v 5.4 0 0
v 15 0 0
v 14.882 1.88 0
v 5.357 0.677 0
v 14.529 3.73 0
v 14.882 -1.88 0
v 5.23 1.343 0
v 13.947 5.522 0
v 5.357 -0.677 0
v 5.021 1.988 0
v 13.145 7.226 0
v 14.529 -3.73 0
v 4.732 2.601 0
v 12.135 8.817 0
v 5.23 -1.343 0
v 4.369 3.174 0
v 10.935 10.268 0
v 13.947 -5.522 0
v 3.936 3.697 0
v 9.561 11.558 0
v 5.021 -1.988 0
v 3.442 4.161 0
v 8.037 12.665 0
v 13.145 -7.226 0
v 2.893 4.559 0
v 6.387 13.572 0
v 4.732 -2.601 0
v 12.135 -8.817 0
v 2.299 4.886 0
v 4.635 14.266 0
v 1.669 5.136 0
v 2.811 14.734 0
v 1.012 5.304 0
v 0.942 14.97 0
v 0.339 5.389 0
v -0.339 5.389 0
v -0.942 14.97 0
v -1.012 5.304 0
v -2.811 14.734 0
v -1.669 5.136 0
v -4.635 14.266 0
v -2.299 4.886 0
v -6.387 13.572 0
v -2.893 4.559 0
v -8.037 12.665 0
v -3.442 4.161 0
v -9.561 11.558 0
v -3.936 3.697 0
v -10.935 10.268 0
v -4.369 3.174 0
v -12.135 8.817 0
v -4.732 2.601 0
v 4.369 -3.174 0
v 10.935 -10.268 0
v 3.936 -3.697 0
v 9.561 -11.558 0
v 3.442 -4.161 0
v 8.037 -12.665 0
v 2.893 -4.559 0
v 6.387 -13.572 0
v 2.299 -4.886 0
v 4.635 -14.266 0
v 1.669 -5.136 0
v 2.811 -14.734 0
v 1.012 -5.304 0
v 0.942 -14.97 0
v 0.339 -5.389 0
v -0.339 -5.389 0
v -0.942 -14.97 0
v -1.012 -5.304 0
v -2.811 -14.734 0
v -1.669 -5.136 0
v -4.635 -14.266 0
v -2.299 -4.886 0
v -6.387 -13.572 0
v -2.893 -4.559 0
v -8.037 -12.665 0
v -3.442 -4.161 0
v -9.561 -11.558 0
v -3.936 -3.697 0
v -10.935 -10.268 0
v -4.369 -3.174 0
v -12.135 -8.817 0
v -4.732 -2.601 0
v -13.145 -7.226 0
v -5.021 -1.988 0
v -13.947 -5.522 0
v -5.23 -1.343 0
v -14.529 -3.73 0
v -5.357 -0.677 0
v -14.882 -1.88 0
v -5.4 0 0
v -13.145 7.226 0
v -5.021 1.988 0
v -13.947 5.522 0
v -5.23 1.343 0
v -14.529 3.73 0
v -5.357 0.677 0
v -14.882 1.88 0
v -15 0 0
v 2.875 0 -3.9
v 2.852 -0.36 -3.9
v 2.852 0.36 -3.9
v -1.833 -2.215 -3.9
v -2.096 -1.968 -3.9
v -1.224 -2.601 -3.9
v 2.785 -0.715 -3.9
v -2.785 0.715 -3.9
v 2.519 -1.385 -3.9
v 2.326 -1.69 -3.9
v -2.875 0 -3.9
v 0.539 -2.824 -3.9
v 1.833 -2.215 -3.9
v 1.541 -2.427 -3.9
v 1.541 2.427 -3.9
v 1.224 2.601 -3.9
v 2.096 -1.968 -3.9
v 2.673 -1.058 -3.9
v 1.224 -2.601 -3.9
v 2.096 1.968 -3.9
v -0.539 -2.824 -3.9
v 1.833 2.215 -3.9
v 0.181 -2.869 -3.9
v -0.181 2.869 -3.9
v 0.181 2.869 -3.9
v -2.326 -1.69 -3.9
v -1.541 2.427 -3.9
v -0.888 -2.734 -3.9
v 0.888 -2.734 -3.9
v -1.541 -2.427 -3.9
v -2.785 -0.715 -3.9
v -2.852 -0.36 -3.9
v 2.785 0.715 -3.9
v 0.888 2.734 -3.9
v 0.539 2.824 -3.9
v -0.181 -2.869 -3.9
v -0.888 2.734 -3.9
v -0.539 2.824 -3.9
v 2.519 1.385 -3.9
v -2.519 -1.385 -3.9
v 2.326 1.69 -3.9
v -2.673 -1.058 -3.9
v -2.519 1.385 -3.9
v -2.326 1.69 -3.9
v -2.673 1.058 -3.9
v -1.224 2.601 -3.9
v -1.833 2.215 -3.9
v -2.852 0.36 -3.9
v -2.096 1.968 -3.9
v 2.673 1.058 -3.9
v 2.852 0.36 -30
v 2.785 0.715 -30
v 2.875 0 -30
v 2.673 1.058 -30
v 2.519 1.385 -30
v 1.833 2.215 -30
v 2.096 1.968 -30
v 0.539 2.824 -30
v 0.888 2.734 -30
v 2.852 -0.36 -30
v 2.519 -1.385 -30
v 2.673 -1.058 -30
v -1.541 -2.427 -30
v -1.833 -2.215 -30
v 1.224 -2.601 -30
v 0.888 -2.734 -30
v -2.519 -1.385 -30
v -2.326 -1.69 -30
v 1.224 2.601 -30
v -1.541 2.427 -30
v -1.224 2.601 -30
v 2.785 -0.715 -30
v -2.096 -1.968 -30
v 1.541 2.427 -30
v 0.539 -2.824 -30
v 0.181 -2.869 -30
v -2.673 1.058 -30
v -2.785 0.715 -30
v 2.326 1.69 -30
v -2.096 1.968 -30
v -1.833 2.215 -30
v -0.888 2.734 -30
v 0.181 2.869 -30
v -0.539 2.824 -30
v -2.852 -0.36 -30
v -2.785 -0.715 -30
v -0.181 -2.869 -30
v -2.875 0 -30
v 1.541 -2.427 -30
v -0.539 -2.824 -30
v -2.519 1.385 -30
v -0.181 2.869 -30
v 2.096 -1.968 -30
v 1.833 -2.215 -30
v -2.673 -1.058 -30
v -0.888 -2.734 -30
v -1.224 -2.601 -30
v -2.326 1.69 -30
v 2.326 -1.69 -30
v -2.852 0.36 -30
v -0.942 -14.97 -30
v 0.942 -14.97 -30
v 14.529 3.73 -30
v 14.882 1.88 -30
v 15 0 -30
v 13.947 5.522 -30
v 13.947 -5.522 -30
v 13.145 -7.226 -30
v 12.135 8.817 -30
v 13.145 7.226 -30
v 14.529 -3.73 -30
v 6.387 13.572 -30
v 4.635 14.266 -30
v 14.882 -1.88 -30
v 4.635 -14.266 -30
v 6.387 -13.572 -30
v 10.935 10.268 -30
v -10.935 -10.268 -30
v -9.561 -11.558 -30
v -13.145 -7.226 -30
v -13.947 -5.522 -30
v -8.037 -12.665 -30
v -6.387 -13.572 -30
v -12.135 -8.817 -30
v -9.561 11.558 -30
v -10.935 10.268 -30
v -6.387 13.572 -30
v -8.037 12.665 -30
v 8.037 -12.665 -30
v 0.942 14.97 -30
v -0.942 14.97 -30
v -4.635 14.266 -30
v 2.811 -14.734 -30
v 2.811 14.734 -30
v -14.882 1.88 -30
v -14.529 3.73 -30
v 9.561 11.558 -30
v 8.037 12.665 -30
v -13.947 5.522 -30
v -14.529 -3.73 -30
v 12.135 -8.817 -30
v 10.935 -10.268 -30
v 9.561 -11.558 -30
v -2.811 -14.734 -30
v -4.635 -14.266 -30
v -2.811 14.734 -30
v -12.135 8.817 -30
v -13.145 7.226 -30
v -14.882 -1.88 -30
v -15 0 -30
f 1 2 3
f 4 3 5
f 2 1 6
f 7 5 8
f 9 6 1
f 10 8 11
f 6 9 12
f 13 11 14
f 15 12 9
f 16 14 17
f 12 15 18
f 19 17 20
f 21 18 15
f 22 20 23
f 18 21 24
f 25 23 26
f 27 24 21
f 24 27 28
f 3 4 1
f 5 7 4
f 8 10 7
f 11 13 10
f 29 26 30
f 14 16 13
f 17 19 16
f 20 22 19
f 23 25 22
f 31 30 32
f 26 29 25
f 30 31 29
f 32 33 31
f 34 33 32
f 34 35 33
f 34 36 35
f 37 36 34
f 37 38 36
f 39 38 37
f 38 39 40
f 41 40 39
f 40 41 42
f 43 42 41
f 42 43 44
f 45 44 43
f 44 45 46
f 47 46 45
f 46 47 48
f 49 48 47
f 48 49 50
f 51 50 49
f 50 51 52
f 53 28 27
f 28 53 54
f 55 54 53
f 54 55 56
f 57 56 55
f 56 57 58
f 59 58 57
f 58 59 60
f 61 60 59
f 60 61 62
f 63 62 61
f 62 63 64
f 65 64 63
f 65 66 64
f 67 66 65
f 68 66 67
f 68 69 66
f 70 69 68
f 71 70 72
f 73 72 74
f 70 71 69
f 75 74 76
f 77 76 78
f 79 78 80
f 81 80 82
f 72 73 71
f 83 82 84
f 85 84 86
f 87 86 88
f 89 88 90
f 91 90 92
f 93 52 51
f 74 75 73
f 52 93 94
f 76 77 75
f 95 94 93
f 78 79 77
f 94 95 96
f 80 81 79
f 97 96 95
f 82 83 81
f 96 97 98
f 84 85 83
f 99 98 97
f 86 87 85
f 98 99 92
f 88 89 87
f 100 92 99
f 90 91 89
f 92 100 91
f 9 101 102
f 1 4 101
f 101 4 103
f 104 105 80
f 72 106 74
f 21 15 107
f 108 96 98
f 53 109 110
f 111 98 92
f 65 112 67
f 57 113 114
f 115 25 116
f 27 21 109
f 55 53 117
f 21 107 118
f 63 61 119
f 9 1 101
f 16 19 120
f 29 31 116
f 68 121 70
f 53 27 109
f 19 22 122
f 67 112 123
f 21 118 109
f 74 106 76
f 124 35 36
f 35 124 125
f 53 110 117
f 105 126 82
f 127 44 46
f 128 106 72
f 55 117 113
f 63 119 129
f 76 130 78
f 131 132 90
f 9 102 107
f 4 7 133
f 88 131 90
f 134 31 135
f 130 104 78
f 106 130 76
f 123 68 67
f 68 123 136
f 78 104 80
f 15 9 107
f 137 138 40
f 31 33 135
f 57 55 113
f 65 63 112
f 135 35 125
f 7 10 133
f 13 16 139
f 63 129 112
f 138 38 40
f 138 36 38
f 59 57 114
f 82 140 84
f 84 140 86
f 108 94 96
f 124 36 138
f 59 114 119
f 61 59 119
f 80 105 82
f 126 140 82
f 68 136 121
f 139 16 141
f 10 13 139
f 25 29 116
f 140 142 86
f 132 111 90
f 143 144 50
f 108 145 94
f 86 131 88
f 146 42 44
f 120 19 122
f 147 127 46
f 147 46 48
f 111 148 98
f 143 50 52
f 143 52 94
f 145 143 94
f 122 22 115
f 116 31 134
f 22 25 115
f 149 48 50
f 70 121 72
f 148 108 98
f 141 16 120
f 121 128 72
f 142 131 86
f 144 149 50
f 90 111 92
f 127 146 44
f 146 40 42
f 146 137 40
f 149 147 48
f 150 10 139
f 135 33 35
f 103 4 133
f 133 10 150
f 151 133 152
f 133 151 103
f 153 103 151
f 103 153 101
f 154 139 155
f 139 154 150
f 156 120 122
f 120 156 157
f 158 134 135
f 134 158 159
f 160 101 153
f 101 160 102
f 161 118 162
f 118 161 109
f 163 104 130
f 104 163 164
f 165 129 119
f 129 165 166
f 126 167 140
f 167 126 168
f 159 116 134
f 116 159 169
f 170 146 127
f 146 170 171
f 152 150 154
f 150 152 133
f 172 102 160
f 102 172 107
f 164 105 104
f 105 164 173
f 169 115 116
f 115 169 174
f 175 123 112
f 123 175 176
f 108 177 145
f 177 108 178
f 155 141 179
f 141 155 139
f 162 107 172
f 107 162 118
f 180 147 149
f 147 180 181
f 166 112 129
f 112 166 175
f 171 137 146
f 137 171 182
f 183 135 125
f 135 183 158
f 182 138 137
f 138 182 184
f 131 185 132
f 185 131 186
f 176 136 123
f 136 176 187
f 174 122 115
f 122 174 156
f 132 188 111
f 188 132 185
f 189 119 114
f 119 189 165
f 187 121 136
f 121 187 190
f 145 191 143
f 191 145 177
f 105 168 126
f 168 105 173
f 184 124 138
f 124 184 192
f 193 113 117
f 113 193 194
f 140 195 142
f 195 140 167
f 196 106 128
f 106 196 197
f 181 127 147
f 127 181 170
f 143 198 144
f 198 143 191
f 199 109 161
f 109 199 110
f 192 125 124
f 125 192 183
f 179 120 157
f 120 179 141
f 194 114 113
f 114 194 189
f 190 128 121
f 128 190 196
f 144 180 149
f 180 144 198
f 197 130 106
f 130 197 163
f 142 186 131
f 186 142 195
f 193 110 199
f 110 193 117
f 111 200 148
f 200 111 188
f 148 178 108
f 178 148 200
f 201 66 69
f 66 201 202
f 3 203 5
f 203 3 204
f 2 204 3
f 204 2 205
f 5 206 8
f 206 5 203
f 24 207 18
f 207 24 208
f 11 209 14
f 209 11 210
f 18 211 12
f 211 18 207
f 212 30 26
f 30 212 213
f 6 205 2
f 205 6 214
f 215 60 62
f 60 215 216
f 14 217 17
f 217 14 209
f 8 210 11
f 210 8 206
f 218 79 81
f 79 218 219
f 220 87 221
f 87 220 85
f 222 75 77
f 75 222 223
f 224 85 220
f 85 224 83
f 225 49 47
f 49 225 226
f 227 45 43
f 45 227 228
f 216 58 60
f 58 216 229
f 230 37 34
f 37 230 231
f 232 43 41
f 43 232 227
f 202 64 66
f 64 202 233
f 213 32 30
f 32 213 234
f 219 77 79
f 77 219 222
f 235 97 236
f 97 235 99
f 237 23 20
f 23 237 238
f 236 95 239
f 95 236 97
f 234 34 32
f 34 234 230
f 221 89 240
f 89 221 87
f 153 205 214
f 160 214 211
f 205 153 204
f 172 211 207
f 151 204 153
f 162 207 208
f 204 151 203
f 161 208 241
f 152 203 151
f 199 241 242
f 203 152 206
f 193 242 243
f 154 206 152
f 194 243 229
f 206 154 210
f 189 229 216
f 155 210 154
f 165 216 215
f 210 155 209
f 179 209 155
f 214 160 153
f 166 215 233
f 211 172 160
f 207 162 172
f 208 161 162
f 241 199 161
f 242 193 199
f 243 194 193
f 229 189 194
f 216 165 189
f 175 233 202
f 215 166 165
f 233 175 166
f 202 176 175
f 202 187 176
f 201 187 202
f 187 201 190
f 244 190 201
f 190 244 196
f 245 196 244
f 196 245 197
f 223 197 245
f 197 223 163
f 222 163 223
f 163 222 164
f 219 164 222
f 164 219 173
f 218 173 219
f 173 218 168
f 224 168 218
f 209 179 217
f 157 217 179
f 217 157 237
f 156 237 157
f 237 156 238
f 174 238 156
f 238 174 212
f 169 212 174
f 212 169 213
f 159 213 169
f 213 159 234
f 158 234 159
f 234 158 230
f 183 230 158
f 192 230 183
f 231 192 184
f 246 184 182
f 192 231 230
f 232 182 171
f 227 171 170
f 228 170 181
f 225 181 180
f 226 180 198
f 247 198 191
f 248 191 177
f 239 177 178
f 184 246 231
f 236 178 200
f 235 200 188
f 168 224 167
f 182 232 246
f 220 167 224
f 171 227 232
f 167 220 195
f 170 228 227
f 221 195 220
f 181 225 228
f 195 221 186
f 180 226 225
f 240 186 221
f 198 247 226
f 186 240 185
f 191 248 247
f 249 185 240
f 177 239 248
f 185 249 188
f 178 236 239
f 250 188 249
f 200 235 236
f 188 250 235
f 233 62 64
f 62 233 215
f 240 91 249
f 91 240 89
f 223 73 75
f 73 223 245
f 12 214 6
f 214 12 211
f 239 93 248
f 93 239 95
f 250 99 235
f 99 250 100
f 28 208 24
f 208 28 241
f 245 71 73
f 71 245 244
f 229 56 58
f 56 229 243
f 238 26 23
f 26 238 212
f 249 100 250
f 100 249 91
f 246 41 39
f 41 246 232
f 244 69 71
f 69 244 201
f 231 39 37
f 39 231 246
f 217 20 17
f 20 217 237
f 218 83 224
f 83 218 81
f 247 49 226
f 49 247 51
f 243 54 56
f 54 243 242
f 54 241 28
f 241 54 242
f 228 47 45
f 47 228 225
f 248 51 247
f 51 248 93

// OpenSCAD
$fn = 50;

difference() {
	union() {
		translate(v = [0, 0, -30.0]) {
			cylinder(h = 30, r = 15.0);
		}
	}
	union() {
		translate(v = [0, 0, 0]) {
			rotate(a = [0, 0, 0]) {
				difference() {
					union() {
						translate(v = [0, 0, -33.0]) {
							cylinder(h = 33, r = 2.6);
						}
						translate(v = [0, 0, -3.9]) {
							cylinder(h = 3.9, r1 = 2.875, r2 = 5.4);
						}
						translate(v = [0, 0, -33.0]) {
							cylinder(h = 33, r = 2.875);
						}
						translate(v = [0, 0, -33.0]) {
							cylinder(h = 33, r = 2.6);
						}
					}
					union();
				}
			}
		}
	}
}
